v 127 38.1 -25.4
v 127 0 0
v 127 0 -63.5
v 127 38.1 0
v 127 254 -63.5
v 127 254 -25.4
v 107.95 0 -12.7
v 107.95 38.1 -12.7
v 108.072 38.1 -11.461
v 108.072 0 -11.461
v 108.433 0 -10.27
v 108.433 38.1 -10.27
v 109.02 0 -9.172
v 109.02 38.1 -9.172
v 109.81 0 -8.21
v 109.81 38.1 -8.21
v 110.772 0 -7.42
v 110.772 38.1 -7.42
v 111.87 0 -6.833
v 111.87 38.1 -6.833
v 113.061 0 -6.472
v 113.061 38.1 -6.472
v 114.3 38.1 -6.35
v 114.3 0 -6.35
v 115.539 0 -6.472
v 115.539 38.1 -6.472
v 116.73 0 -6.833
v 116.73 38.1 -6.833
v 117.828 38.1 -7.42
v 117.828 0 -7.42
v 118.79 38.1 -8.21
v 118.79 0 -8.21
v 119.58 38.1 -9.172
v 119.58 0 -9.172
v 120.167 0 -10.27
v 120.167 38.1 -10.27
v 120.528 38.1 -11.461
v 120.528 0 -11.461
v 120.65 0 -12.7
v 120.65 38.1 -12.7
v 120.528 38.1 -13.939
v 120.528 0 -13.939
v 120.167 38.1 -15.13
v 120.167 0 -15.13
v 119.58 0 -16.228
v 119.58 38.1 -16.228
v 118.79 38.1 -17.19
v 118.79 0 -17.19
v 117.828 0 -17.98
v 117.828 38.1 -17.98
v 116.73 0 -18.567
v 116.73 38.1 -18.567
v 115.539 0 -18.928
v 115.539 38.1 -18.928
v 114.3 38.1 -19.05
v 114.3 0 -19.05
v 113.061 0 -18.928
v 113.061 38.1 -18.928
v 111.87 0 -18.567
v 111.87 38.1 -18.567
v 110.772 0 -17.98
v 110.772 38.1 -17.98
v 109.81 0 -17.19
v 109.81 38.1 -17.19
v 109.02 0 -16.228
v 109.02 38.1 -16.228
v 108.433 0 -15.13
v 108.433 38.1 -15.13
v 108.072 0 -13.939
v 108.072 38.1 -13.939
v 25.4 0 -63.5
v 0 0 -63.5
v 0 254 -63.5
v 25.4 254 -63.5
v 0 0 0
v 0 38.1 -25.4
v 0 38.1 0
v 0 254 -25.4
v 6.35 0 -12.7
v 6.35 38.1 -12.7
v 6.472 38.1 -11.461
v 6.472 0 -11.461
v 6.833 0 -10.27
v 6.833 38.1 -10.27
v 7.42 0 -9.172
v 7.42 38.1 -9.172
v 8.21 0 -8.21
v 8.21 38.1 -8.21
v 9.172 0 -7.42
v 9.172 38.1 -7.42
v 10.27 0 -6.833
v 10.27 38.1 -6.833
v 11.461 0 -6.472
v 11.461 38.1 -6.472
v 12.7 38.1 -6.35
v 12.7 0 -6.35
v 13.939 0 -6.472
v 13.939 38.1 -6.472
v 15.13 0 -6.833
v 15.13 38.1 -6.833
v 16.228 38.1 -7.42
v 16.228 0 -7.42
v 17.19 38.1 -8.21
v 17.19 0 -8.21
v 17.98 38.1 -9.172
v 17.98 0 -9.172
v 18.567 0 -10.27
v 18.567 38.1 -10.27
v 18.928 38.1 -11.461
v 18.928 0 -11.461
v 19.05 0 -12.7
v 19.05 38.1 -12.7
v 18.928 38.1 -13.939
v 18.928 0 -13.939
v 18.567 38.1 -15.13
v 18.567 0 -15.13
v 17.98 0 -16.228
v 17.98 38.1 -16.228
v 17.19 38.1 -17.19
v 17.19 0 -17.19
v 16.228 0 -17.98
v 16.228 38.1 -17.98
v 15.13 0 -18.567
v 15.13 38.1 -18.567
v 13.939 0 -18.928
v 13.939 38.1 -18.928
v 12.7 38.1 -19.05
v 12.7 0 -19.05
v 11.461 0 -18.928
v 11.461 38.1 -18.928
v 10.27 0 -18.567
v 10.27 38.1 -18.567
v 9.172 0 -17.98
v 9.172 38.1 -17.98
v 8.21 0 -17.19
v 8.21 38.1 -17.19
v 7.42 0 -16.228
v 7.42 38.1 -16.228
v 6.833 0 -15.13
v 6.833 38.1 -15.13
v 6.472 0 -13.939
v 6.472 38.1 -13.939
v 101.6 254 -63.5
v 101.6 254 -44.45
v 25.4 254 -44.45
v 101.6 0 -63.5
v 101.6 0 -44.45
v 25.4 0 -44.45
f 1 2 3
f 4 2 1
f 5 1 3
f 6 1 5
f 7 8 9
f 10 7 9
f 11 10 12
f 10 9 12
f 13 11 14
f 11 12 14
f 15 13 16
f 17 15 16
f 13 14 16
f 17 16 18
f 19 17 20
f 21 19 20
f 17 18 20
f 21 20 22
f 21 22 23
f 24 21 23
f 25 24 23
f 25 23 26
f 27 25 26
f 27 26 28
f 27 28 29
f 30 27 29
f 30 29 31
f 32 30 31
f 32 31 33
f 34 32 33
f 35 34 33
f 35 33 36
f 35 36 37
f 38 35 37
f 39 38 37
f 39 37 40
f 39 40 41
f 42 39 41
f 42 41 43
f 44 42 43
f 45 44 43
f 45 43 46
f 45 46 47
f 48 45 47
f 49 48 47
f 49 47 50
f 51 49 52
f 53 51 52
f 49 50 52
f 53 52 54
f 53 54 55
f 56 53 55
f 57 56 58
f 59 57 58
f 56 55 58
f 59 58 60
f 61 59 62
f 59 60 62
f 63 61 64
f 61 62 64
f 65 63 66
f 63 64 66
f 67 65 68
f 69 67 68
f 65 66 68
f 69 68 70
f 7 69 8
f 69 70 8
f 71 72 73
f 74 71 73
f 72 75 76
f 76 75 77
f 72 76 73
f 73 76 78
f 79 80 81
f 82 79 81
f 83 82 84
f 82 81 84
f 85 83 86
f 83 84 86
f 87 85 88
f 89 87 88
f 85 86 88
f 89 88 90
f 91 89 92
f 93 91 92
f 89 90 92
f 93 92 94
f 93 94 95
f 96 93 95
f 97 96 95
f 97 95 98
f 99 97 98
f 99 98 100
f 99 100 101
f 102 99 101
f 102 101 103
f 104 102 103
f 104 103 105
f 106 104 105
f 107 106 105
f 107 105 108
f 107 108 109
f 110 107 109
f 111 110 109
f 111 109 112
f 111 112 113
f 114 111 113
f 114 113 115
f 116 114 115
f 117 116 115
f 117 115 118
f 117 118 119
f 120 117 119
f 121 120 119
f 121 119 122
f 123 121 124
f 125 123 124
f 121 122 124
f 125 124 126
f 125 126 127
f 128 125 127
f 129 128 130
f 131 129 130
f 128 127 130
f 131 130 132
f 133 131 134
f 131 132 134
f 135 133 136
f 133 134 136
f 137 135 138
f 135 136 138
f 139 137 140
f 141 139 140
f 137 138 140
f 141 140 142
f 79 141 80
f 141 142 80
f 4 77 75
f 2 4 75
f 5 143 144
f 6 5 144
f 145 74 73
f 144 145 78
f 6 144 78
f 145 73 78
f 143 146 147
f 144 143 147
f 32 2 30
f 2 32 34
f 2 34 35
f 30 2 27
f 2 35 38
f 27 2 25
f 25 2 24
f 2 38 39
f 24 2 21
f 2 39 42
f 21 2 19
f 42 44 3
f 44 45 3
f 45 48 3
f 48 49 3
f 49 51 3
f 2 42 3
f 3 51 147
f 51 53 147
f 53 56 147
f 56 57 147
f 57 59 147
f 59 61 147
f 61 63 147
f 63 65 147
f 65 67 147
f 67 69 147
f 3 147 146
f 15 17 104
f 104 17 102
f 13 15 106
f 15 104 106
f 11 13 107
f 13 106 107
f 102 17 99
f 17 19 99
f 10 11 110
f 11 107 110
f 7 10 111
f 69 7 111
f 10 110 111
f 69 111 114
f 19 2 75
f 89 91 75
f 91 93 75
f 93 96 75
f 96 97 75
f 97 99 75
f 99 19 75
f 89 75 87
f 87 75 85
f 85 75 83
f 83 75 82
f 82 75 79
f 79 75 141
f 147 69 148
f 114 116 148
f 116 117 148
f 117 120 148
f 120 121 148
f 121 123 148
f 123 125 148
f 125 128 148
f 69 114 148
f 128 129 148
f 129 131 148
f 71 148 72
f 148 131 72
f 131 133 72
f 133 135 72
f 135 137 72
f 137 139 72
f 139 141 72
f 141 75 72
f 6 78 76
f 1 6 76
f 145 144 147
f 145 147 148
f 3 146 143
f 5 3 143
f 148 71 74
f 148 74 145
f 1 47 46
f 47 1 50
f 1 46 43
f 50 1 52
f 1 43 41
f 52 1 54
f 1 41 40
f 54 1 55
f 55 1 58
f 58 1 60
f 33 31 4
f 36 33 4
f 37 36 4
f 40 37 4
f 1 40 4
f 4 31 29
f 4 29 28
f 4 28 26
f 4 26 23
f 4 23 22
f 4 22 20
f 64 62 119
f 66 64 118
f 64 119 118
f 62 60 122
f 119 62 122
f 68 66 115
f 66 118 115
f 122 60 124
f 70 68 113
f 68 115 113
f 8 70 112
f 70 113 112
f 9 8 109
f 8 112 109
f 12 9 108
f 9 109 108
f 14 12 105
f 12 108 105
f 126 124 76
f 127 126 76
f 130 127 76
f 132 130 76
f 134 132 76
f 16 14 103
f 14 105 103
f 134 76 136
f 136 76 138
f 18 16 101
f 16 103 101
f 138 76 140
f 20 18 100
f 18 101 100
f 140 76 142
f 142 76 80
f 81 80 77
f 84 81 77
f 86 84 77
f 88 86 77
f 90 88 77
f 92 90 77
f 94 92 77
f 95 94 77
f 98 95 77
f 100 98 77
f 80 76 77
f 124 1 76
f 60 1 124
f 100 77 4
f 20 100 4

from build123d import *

# Parameters (mm, degrees)
F1_DEPTH = 127
F3_D     = 12.7
F3_DEPTH = 38.1
F5_D     = 12.7
F5_DEPTH = 38.1
F6_W     = 76.2
F6_H     = 19.05
F7_DEPTH = 254.001


with BuildPart() as f1:
    # F0 (on Right) → F1 (new body)
    with BuildSketch(Plane.YZ):
        Polygon((38.1, 0), (0, 0), (0, -63.5), (254, -63.5), (254, -25.4), (38.1, -25.4), align=None)
    extrude(amount=F1_DEPTH)

    # F3
    with Locations(Plane.XZ):
        with Locations((12.7, -12.7)):
            Hole(F3_D / 2, depth=F3_DEPTH)

    # F5
    with Locations(Plane.XZ):
        with Locations((114.3, -12.7)):
            Hole(F5_D / 2, depth=F5_DEPTH)

    # F6 (on face) → F7 (cut, through all)
    with BuildSketch(Plane(origin=(0, 254, 0), x_dir=(-1, 0, 0), z_dir=(0, 1, 0))):
        with Locations((-63.5, -53.975)):
            Rectangle(F6_W, F6_H)
    extrude(amount=-F7_DEPTH, mode=Mode.SUBTRACT)


solid = f1.part
